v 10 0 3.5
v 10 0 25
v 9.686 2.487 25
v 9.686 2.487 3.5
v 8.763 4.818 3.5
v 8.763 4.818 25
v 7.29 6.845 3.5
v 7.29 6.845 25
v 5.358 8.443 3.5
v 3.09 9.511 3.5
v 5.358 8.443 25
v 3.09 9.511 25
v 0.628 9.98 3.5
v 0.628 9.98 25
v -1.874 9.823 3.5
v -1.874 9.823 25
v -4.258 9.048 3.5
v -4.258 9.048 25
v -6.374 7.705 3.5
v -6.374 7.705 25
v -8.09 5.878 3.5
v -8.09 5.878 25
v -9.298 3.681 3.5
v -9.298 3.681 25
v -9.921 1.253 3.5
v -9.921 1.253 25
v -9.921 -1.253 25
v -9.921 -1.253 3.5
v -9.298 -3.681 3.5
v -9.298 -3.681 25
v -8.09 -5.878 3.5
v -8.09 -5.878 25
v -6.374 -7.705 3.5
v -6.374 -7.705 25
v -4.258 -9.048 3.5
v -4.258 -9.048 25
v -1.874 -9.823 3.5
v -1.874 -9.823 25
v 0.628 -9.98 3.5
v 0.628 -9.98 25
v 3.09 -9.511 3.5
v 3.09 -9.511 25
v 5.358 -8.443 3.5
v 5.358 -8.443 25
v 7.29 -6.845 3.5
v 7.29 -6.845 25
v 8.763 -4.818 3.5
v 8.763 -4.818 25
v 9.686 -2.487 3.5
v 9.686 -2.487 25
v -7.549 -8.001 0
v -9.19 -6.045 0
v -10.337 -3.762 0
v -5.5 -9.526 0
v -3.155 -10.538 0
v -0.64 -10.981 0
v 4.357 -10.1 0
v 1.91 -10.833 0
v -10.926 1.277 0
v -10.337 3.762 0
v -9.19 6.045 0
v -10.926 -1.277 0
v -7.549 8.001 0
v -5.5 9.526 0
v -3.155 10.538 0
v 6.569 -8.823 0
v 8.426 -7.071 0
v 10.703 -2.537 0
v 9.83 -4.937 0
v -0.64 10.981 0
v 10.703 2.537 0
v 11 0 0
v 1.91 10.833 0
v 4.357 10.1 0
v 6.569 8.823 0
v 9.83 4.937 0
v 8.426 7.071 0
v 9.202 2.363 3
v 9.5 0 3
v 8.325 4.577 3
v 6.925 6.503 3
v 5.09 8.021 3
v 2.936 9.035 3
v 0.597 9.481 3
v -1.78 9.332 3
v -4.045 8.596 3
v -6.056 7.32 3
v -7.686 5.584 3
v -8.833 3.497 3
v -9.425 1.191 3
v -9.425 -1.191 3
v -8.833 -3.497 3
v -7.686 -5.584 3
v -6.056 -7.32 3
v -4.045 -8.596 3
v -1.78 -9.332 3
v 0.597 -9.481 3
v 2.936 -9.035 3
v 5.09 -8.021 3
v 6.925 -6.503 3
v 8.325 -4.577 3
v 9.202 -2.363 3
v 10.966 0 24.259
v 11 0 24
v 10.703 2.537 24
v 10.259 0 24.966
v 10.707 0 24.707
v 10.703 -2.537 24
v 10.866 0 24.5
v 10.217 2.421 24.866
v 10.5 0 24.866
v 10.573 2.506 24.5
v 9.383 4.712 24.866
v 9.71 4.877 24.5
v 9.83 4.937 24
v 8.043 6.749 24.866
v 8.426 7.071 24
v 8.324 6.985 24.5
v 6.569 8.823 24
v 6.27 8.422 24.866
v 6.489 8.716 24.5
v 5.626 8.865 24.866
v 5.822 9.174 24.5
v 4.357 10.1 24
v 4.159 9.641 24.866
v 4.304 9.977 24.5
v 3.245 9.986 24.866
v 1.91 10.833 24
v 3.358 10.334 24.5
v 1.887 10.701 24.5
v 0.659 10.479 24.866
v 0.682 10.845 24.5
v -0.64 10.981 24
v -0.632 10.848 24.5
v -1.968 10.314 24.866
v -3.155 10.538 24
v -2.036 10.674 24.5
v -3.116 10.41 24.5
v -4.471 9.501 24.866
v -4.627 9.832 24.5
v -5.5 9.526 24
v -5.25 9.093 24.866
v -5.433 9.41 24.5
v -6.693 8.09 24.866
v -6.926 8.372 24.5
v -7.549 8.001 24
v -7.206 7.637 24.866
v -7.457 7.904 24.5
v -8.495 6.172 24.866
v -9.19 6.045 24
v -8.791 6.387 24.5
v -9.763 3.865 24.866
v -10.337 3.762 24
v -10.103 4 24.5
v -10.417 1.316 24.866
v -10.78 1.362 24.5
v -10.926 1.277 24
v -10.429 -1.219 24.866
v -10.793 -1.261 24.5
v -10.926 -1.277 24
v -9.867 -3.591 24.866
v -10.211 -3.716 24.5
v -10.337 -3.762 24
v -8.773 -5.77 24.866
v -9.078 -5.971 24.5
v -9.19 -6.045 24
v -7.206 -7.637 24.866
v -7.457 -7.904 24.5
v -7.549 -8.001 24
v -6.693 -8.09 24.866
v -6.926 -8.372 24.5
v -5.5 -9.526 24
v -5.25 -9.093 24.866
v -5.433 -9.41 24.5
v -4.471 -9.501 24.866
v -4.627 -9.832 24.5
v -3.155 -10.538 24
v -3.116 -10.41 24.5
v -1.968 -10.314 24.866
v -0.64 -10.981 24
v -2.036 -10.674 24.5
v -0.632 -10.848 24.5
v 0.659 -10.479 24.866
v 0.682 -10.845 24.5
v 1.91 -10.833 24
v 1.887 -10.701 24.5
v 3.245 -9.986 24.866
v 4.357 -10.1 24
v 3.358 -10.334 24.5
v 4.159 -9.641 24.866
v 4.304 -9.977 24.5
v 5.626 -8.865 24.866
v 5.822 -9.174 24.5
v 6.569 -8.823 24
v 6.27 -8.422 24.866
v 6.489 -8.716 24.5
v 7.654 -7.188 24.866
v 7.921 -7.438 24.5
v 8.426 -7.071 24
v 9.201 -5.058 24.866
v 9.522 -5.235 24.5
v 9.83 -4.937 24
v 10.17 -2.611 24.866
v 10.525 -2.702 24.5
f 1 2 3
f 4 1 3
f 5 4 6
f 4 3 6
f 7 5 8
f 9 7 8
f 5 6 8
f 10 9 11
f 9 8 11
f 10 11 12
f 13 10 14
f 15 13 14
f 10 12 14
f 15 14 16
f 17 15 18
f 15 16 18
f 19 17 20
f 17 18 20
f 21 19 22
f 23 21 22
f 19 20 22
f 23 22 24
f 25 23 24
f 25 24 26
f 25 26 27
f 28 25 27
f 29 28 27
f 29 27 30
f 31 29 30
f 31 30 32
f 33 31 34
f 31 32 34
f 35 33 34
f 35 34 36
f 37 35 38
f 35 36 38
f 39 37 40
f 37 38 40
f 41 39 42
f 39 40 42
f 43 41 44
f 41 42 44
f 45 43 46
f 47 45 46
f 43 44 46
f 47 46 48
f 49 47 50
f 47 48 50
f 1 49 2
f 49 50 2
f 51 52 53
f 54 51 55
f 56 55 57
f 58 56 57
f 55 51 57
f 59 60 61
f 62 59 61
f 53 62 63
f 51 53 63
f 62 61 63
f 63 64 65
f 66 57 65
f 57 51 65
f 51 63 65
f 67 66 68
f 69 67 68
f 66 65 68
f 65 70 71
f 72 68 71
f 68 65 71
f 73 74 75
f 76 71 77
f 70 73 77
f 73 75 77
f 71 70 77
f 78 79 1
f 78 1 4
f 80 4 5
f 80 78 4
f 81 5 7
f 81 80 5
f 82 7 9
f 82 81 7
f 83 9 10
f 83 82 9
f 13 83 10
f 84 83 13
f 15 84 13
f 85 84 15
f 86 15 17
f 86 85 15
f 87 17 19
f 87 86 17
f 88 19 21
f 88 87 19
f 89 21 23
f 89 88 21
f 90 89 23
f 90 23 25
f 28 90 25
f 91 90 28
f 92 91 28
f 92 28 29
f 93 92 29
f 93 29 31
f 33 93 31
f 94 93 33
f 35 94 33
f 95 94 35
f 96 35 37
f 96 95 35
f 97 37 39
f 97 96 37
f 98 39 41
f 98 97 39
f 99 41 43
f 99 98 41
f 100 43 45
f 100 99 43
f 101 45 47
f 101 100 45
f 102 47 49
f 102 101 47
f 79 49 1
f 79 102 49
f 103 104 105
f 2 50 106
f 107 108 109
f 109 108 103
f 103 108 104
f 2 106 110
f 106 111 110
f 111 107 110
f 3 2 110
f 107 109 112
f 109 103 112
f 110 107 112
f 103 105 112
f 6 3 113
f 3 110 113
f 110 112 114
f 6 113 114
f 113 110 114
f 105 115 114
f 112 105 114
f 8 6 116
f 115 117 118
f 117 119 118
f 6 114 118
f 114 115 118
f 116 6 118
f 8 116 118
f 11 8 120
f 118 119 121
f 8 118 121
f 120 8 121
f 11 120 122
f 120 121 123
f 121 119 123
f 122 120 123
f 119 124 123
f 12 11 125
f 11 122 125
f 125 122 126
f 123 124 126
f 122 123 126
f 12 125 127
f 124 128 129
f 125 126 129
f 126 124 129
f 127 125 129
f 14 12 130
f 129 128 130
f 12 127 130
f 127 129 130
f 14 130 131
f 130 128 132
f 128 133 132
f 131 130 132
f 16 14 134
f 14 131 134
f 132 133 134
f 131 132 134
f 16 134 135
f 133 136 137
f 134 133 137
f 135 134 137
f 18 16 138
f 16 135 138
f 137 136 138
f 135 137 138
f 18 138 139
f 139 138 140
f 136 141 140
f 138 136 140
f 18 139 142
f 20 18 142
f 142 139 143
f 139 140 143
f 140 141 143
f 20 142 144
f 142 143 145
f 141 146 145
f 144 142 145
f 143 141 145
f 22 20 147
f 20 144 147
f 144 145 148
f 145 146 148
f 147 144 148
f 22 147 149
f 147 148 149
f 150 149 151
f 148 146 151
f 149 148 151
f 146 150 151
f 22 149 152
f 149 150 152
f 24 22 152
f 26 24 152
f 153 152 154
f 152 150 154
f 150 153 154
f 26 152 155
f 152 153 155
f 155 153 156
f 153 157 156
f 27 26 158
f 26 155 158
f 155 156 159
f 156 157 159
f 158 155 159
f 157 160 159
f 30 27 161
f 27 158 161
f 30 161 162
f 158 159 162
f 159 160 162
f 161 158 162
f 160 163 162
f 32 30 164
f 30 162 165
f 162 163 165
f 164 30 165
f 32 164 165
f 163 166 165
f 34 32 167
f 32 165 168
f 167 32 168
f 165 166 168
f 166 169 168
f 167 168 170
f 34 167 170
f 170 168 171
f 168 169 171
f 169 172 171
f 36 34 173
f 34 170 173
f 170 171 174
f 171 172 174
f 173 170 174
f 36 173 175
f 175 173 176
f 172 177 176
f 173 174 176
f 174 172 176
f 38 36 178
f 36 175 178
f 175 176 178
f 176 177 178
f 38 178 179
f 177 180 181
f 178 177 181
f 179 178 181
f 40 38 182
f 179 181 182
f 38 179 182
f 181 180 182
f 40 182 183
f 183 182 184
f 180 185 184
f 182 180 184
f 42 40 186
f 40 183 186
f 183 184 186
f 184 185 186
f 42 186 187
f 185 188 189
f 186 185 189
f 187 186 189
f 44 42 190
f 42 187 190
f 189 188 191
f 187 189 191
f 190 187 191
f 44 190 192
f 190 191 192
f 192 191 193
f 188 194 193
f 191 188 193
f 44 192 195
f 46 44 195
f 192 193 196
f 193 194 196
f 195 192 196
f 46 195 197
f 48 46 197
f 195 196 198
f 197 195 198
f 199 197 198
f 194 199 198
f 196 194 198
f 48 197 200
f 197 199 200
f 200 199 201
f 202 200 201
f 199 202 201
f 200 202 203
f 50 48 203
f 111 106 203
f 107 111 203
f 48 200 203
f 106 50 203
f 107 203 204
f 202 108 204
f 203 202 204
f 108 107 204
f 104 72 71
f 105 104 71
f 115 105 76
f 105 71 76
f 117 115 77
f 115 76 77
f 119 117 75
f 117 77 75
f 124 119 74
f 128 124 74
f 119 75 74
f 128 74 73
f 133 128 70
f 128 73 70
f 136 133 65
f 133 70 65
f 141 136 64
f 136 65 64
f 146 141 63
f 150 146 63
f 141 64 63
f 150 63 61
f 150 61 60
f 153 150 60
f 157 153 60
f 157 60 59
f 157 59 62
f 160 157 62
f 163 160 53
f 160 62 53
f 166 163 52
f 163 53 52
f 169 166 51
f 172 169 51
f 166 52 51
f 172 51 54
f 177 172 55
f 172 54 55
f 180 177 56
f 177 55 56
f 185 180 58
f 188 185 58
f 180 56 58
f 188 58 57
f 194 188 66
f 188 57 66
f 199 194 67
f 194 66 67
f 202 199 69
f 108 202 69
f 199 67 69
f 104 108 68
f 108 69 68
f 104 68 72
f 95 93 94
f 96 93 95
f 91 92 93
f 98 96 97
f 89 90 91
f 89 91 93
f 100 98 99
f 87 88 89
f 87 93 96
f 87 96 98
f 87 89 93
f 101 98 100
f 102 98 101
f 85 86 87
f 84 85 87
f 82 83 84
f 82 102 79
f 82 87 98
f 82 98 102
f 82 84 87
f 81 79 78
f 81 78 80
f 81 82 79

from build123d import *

# Parameters (mm, degrees)
F0_R     = 11
F1_DEPTH = 25
F2_R     = 10
F3_DEPTH = 22
F4_SIZE  = 0.5
F5_R     = 0.99999


# Not quite as in the source:
# - a fillet or chamfer is up to 0.001 mm smaller than in the source, because OpenCascade refuses the exact size


with BuildPart() as f1:
    # F0 (on Top) → F1 (new body)
    with BuildSketch(Plane.XY):
        Circle(F0_R)
    extrude(amount=F1_DEPTH)

    # F2 (on face) → F3 (cut)
    with BuildSketch(Plane.XY.offset(25)):
        Circle(F2_R)
    extrude(amount=-F3_DEPTH, mode=Mode.SUBTRACT)

    # F4
    f4_edges = [f1.edges().sort_by_distance(p)[0] for p in [
        (-10, 0, 3),
    ]]
    chamfer(f4_edges, length=F4_SIZE)

    # F5 (radius 1 in the source; OpenCascade refuses exactly that, so slightly less here)
    f5_edges = [f1.edges().sort_by_distance(p)[0] for p in [
        (-11, 0, 25),
    ]]
    fillet(f5_edges, radius=F5_R)


solid = f1.part
